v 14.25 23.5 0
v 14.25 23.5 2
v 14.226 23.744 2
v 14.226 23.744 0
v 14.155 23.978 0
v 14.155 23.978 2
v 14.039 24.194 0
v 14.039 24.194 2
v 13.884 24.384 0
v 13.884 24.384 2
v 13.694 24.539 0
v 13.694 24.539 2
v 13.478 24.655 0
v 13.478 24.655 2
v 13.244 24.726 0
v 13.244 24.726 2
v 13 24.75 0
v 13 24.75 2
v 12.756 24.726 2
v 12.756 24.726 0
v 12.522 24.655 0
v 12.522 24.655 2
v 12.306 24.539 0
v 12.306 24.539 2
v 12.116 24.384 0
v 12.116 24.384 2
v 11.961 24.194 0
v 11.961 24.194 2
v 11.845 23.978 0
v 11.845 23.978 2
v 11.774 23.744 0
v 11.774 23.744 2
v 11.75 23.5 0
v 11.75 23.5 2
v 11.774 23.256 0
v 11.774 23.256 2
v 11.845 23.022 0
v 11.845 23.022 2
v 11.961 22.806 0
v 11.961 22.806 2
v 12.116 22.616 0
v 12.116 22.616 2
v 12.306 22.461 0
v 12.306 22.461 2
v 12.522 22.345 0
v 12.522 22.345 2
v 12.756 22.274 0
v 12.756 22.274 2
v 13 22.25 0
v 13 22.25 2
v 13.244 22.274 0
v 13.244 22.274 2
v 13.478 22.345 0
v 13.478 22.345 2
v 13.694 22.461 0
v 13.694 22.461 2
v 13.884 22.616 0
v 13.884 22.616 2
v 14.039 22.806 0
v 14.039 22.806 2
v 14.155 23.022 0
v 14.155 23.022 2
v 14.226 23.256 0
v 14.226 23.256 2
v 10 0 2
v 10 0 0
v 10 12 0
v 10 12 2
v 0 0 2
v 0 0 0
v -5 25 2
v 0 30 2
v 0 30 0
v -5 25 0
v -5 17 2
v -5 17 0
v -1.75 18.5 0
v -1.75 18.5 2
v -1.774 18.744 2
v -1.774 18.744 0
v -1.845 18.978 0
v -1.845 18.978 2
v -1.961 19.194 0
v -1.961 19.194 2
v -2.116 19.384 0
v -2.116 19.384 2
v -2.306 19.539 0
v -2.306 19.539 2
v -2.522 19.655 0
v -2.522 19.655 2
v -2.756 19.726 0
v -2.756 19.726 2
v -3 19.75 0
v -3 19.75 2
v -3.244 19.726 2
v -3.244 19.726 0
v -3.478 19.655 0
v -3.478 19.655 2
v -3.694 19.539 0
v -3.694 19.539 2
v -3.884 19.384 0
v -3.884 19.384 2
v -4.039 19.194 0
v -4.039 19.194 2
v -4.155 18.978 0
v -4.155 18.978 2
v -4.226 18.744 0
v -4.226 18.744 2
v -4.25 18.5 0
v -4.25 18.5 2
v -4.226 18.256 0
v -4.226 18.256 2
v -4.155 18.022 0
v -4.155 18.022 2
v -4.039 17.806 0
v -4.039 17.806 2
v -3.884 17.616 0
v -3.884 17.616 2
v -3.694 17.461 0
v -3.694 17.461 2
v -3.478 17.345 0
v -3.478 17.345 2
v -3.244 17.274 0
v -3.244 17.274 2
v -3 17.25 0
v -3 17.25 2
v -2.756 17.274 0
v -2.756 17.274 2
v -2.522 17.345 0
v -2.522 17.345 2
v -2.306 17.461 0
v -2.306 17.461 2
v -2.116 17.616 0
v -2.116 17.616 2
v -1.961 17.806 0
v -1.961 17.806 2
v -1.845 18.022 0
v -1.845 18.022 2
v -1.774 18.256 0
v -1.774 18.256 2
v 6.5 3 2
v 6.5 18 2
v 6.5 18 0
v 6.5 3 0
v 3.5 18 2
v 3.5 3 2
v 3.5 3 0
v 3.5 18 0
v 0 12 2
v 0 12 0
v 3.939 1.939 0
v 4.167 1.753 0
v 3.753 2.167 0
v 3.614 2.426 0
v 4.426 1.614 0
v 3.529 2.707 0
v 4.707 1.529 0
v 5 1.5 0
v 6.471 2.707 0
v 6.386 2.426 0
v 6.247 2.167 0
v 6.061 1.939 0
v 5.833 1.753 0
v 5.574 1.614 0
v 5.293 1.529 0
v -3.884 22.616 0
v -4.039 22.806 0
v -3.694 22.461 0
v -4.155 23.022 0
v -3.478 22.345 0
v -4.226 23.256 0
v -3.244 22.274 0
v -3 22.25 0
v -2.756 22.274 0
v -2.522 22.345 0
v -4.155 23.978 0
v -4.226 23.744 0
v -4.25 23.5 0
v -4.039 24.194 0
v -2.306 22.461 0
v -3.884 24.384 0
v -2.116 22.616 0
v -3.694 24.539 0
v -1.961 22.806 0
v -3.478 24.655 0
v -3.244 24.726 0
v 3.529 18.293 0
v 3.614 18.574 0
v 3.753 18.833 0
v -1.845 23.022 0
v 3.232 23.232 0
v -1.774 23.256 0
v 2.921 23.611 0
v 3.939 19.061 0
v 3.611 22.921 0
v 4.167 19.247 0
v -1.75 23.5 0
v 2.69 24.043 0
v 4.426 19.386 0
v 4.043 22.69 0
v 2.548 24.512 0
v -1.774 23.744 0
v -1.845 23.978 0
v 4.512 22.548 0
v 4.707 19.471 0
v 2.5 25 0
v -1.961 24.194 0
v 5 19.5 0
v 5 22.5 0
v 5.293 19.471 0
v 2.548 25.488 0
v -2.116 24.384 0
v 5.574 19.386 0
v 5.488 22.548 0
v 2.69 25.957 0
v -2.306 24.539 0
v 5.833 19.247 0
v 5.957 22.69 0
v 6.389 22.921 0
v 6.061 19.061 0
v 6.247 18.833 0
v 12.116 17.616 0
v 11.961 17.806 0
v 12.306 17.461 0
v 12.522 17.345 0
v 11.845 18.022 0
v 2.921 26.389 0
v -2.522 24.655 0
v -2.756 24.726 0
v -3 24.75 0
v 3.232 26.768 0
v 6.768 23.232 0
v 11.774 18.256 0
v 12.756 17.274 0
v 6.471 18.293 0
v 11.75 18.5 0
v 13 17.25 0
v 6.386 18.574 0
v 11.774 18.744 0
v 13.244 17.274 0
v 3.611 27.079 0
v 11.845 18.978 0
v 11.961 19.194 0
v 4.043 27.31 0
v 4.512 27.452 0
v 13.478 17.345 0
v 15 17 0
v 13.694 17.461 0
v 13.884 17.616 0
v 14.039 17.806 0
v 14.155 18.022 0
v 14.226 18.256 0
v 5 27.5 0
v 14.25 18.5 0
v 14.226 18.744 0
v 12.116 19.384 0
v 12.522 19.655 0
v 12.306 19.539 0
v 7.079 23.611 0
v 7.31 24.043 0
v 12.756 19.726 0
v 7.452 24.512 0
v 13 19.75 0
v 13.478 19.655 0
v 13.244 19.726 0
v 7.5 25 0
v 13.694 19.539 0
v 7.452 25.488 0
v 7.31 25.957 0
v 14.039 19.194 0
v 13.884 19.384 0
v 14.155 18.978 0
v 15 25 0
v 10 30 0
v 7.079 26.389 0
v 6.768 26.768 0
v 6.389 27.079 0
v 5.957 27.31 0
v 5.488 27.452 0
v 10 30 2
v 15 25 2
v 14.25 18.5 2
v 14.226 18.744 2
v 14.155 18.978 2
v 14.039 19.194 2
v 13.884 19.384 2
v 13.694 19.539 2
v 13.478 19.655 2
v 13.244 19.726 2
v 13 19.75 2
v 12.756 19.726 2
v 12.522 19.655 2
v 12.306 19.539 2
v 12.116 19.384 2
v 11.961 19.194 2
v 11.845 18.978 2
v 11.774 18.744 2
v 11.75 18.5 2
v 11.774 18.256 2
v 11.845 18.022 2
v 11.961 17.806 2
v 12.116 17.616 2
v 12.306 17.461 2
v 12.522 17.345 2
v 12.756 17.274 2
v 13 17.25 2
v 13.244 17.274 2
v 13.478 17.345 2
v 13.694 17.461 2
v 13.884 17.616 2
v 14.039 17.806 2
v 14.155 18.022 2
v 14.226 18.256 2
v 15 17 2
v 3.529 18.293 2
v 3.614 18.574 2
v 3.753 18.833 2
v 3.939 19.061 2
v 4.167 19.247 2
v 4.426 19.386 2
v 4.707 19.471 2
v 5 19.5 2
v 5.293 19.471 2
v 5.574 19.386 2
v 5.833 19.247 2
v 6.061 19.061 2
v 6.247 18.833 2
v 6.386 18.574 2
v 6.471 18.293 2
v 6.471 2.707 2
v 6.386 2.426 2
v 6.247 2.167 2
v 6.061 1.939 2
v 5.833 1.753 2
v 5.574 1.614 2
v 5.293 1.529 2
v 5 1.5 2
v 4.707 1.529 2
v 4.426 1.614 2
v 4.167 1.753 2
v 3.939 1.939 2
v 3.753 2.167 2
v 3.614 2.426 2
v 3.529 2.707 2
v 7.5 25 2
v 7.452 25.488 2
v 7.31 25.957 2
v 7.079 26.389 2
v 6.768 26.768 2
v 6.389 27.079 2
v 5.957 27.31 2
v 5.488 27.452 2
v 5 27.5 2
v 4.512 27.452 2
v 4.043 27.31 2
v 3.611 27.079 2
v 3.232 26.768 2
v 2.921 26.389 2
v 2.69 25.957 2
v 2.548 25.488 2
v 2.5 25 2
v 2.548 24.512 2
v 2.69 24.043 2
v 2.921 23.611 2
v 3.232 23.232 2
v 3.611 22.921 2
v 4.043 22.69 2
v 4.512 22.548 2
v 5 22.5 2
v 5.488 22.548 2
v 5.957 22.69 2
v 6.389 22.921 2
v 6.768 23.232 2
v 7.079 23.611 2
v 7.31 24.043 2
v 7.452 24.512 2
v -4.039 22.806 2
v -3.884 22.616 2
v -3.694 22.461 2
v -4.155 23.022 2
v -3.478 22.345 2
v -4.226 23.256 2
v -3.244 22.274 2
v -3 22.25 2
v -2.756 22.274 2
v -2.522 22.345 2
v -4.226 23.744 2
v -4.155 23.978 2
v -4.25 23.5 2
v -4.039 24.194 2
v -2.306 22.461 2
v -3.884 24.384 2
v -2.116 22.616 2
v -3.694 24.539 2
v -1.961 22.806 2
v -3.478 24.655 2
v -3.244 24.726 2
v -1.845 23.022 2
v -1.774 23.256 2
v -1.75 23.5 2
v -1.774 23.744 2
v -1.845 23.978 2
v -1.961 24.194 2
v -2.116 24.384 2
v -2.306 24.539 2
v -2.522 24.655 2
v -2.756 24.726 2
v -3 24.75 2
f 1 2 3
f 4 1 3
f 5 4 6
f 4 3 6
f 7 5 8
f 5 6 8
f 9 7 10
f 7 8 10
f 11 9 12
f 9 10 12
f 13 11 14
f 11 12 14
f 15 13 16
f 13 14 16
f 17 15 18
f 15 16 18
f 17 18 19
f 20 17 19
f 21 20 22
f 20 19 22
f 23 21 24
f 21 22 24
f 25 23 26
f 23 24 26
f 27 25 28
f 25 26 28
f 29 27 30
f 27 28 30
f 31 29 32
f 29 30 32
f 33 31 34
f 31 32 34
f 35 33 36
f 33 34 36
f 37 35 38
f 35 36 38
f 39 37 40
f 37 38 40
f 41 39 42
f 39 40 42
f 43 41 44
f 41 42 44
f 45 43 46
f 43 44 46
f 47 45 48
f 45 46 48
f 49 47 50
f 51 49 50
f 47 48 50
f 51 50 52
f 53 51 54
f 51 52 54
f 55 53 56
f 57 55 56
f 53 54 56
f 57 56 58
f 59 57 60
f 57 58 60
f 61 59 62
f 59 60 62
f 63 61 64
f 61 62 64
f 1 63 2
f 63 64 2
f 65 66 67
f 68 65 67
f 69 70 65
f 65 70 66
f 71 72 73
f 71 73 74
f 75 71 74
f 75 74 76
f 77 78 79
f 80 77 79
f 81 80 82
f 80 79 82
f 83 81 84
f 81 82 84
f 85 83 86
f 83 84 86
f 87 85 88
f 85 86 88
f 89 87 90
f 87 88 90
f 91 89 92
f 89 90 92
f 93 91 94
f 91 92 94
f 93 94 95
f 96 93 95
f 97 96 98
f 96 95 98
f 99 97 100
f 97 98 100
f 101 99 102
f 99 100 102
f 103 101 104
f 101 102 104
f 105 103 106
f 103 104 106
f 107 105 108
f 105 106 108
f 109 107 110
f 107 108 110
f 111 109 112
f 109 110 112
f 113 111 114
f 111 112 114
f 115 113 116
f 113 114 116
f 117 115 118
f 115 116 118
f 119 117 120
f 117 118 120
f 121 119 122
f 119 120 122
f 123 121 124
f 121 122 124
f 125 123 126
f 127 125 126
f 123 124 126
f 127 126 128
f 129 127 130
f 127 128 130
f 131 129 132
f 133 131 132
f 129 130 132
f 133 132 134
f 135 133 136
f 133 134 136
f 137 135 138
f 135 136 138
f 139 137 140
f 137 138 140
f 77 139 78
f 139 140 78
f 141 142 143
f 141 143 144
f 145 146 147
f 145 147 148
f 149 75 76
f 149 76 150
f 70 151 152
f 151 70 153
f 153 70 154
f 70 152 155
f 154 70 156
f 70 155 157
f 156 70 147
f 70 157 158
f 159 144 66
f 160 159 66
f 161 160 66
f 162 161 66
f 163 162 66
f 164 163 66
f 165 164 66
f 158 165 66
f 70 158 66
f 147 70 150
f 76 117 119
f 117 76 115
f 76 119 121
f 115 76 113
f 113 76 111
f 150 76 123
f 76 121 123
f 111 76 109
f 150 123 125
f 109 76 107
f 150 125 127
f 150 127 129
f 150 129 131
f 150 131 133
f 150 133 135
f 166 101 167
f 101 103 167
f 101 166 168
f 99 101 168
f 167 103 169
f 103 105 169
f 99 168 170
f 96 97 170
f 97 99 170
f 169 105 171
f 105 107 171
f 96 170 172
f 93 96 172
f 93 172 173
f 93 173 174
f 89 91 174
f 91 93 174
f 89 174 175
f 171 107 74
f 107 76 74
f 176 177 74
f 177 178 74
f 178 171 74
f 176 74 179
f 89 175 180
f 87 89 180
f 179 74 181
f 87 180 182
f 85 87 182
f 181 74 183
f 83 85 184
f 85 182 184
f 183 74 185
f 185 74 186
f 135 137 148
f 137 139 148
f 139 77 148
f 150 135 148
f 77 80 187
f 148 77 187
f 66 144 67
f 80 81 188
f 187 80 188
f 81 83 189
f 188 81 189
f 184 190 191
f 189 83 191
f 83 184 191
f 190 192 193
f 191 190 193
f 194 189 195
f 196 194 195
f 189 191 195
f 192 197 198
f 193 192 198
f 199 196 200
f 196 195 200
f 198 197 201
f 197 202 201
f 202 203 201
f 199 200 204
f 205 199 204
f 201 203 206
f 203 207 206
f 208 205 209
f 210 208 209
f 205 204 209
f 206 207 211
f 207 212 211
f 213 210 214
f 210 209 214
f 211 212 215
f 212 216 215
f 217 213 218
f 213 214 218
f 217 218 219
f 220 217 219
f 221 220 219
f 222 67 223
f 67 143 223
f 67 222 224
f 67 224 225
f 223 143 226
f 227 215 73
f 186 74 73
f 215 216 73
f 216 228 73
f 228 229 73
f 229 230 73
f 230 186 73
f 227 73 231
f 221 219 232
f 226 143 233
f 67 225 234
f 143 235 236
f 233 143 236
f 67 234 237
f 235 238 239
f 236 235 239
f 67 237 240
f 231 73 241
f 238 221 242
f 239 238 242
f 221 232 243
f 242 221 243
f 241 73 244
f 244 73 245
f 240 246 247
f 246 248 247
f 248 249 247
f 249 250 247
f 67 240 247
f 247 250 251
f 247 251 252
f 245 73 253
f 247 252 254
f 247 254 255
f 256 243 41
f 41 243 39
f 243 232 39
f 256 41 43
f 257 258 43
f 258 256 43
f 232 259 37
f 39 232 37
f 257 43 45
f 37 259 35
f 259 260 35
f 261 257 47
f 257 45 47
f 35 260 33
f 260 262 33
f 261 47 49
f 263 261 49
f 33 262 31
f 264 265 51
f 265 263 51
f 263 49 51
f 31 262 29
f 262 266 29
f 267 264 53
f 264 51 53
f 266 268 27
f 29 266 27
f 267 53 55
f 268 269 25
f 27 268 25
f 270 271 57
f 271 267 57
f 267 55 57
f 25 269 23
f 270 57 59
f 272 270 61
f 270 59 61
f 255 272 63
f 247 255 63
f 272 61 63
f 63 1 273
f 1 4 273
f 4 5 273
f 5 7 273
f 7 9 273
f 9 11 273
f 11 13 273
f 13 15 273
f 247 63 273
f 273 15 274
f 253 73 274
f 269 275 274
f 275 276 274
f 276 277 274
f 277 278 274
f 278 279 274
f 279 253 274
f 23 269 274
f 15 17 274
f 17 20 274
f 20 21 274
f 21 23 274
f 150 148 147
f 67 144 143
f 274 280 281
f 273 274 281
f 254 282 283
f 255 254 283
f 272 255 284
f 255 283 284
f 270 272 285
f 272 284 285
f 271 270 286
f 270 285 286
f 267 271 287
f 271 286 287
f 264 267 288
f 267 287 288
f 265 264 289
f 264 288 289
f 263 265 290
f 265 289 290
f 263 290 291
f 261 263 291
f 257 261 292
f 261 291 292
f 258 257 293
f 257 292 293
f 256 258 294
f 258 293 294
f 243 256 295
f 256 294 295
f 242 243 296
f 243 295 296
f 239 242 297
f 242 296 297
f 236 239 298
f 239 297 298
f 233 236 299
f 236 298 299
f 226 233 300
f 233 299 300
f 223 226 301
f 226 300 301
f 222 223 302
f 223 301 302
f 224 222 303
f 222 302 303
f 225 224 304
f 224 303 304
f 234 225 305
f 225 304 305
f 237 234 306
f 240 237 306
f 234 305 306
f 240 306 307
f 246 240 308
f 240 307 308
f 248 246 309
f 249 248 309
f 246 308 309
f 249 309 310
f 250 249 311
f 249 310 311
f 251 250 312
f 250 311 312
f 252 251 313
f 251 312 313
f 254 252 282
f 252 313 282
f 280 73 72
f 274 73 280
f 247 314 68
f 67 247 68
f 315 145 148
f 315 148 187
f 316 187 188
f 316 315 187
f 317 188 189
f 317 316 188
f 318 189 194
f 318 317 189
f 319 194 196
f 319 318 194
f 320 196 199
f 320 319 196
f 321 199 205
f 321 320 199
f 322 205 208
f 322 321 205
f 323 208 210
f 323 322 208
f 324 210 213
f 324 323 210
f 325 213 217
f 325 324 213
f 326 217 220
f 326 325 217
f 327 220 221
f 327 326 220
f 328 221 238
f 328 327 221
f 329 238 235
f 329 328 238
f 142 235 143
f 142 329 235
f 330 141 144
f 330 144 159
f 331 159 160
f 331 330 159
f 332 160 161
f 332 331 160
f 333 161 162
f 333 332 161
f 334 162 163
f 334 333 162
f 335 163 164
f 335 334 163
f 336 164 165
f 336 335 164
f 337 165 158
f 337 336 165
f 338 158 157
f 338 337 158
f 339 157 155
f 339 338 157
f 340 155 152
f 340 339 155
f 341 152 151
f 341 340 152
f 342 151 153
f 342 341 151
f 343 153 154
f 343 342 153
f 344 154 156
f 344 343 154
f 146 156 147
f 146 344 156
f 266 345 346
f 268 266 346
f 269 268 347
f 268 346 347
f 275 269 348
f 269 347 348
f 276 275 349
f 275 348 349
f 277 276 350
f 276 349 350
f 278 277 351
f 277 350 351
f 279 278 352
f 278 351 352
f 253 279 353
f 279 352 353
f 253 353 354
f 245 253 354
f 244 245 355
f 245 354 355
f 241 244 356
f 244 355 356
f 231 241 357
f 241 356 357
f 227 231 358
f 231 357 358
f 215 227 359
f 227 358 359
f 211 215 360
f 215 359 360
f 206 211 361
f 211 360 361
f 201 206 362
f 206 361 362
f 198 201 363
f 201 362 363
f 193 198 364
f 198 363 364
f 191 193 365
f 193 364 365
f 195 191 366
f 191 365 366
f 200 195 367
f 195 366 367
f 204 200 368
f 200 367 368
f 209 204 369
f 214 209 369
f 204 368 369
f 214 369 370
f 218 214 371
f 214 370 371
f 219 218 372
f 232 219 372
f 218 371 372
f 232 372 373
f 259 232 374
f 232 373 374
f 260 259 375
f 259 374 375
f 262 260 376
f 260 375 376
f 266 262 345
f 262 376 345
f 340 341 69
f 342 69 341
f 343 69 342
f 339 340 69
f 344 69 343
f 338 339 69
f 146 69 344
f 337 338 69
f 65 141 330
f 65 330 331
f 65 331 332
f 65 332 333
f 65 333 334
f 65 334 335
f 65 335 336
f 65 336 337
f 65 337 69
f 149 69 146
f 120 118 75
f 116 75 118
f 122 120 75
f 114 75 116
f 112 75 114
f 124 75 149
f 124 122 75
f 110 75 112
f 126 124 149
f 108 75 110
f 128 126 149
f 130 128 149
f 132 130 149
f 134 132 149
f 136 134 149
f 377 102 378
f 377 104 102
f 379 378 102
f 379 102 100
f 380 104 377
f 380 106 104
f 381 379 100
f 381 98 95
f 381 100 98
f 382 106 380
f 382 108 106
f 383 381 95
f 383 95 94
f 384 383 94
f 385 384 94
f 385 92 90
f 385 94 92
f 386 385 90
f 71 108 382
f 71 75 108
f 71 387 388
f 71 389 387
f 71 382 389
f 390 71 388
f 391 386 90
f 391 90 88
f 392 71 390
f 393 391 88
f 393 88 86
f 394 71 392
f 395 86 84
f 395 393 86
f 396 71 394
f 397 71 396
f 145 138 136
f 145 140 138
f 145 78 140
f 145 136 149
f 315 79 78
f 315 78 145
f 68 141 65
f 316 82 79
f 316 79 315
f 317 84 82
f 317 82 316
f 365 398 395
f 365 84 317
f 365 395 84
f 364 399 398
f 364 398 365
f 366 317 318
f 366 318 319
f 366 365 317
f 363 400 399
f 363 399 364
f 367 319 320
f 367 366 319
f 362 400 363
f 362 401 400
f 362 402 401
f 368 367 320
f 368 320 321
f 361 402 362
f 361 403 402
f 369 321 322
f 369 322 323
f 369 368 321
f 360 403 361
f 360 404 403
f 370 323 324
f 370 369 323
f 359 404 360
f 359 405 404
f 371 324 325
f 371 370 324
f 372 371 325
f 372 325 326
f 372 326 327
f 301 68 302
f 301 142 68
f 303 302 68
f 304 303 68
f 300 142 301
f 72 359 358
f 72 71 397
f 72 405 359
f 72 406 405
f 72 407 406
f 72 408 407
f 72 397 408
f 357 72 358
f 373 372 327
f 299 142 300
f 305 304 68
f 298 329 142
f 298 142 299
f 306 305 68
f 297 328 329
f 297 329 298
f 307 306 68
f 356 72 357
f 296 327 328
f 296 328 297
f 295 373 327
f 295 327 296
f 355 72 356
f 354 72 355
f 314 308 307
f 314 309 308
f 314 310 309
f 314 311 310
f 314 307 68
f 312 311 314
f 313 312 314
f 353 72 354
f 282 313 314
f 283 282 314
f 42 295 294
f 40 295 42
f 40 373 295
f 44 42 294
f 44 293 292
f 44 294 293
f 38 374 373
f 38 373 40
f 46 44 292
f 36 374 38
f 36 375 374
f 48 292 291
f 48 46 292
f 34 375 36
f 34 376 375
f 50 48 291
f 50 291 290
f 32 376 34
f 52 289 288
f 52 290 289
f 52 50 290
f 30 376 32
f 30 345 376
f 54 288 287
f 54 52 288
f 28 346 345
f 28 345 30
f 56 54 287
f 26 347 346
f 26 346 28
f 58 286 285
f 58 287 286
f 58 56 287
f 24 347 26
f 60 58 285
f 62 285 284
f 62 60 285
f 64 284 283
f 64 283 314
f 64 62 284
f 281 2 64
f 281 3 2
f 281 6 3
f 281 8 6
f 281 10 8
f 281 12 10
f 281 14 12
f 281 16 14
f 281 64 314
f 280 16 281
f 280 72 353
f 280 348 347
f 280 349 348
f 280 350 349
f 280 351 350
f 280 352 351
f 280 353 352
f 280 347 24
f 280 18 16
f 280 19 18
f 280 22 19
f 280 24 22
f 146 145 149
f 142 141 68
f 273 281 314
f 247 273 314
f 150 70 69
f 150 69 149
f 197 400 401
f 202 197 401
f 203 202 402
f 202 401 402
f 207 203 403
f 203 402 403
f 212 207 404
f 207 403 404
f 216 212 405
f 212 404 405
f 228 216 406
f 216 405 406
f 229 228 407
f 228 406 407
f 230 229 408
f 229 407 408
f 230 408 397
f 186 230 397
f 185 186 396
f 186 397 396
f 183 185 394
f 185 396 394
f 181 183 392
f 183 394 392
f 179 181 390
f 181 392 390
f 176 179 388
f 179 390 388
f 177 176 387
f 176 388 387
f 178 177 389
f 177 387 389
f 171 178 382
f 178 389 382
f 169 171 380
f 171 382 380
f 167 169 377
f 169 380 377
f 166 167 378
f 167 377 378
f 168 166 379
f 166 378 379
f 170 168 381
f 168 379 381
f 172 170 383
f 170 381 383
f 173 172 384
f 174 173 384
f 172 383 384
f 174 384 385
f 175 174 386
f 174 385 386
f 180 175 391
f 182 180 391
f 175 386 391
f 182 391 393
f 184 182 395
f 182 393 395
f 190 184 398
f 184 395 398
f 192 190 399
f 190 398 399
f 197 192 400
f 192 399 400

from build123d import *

# Parameters (mm, degrees)
SKETCH1_W           = 10
SKETCH1_H           = 30
BOSS_EXTRUDE1_DEPTH = 2
SKETCH2_R           = 2.5
CUT_EXTRUDE1_DEPTH  = 2
CUT_EXTRUDE2_DEPTH  = 2
BOSS_EXTRUDE2_DEPTH = 2
SKETCH5_R           = 1.25
CUT_EXTRUDE3_DEPTH  = 2


with BuildPart() as part:
    # Sketch1 → Boss-Extrude1 (new body)
    with BuildSketch(Plane.XY):
        with Locations((5, 15)):
            Rectangle(SKETCH1_W, SKETCH1_H)
    extrude(amount=BOSS_EXTRUDE1_DEPTH)

    # Sketch2 → Cut-Extrude1 (cut)
    with BuildSketch(Plane.XY.offset(2)):
        with Locations((5, 25)):
            Circle(SKETCH2_R)
    extrude(amount=-CUT_EXTRUDE1_DEPTH, mode=Mode.SUBTRACT)

    # Sketch3 → Cut-Extrude2 (cut)
    with BuildSketch(Plane.XY.offset(2)):
        with BuildLine():
            Line((3.5, 3), (3.5, 18))
            ThreePointArc((3.5, 18), (5, 19.5), (6.5, 18))
            Line((6.5, 18), (6.5, 3))
            ThreePointArc((6.5, 3), (5, 1.5), (3.5, 3))
        make_face()
    extrude(amount=-CUT_EXTRUDE2_DEPTH, mode=Mode.SUBTRACT)

    # Sketch4 → Boss-Extrude2 (add)
    with BuildSketch(Plane.XY.offset(2)):
        Polygon((0, 30), (-5, 25), (-5, 17), (0, 12), align=None)
        Polygon((10, 30), (15, 25), (15, 17), (10, 12), align=None)
    extrude(amount=-BOSS_EXTRUDE2_DEPTH)

    # Sketch5 → Cut-Extrude3 (cut)
    with BuildSketch(Plane.XY.offset(2)):
        with Locations((-3, 23.5)):
            Circle(SKETCH5_R)
        with Locations((-3, 18.5)):
            Circle(SKETCH5_R)
        with Locations((13, 18.5)):
            Circle(SKETCH5_R)
        with Locations((13, 23.5)):
            Circle(SKETCH5_R)
    extrude(amount=-CUT_EXTRUDE3_DEPTH, mode=Mode.SUBTRACT)


solid = part.part
